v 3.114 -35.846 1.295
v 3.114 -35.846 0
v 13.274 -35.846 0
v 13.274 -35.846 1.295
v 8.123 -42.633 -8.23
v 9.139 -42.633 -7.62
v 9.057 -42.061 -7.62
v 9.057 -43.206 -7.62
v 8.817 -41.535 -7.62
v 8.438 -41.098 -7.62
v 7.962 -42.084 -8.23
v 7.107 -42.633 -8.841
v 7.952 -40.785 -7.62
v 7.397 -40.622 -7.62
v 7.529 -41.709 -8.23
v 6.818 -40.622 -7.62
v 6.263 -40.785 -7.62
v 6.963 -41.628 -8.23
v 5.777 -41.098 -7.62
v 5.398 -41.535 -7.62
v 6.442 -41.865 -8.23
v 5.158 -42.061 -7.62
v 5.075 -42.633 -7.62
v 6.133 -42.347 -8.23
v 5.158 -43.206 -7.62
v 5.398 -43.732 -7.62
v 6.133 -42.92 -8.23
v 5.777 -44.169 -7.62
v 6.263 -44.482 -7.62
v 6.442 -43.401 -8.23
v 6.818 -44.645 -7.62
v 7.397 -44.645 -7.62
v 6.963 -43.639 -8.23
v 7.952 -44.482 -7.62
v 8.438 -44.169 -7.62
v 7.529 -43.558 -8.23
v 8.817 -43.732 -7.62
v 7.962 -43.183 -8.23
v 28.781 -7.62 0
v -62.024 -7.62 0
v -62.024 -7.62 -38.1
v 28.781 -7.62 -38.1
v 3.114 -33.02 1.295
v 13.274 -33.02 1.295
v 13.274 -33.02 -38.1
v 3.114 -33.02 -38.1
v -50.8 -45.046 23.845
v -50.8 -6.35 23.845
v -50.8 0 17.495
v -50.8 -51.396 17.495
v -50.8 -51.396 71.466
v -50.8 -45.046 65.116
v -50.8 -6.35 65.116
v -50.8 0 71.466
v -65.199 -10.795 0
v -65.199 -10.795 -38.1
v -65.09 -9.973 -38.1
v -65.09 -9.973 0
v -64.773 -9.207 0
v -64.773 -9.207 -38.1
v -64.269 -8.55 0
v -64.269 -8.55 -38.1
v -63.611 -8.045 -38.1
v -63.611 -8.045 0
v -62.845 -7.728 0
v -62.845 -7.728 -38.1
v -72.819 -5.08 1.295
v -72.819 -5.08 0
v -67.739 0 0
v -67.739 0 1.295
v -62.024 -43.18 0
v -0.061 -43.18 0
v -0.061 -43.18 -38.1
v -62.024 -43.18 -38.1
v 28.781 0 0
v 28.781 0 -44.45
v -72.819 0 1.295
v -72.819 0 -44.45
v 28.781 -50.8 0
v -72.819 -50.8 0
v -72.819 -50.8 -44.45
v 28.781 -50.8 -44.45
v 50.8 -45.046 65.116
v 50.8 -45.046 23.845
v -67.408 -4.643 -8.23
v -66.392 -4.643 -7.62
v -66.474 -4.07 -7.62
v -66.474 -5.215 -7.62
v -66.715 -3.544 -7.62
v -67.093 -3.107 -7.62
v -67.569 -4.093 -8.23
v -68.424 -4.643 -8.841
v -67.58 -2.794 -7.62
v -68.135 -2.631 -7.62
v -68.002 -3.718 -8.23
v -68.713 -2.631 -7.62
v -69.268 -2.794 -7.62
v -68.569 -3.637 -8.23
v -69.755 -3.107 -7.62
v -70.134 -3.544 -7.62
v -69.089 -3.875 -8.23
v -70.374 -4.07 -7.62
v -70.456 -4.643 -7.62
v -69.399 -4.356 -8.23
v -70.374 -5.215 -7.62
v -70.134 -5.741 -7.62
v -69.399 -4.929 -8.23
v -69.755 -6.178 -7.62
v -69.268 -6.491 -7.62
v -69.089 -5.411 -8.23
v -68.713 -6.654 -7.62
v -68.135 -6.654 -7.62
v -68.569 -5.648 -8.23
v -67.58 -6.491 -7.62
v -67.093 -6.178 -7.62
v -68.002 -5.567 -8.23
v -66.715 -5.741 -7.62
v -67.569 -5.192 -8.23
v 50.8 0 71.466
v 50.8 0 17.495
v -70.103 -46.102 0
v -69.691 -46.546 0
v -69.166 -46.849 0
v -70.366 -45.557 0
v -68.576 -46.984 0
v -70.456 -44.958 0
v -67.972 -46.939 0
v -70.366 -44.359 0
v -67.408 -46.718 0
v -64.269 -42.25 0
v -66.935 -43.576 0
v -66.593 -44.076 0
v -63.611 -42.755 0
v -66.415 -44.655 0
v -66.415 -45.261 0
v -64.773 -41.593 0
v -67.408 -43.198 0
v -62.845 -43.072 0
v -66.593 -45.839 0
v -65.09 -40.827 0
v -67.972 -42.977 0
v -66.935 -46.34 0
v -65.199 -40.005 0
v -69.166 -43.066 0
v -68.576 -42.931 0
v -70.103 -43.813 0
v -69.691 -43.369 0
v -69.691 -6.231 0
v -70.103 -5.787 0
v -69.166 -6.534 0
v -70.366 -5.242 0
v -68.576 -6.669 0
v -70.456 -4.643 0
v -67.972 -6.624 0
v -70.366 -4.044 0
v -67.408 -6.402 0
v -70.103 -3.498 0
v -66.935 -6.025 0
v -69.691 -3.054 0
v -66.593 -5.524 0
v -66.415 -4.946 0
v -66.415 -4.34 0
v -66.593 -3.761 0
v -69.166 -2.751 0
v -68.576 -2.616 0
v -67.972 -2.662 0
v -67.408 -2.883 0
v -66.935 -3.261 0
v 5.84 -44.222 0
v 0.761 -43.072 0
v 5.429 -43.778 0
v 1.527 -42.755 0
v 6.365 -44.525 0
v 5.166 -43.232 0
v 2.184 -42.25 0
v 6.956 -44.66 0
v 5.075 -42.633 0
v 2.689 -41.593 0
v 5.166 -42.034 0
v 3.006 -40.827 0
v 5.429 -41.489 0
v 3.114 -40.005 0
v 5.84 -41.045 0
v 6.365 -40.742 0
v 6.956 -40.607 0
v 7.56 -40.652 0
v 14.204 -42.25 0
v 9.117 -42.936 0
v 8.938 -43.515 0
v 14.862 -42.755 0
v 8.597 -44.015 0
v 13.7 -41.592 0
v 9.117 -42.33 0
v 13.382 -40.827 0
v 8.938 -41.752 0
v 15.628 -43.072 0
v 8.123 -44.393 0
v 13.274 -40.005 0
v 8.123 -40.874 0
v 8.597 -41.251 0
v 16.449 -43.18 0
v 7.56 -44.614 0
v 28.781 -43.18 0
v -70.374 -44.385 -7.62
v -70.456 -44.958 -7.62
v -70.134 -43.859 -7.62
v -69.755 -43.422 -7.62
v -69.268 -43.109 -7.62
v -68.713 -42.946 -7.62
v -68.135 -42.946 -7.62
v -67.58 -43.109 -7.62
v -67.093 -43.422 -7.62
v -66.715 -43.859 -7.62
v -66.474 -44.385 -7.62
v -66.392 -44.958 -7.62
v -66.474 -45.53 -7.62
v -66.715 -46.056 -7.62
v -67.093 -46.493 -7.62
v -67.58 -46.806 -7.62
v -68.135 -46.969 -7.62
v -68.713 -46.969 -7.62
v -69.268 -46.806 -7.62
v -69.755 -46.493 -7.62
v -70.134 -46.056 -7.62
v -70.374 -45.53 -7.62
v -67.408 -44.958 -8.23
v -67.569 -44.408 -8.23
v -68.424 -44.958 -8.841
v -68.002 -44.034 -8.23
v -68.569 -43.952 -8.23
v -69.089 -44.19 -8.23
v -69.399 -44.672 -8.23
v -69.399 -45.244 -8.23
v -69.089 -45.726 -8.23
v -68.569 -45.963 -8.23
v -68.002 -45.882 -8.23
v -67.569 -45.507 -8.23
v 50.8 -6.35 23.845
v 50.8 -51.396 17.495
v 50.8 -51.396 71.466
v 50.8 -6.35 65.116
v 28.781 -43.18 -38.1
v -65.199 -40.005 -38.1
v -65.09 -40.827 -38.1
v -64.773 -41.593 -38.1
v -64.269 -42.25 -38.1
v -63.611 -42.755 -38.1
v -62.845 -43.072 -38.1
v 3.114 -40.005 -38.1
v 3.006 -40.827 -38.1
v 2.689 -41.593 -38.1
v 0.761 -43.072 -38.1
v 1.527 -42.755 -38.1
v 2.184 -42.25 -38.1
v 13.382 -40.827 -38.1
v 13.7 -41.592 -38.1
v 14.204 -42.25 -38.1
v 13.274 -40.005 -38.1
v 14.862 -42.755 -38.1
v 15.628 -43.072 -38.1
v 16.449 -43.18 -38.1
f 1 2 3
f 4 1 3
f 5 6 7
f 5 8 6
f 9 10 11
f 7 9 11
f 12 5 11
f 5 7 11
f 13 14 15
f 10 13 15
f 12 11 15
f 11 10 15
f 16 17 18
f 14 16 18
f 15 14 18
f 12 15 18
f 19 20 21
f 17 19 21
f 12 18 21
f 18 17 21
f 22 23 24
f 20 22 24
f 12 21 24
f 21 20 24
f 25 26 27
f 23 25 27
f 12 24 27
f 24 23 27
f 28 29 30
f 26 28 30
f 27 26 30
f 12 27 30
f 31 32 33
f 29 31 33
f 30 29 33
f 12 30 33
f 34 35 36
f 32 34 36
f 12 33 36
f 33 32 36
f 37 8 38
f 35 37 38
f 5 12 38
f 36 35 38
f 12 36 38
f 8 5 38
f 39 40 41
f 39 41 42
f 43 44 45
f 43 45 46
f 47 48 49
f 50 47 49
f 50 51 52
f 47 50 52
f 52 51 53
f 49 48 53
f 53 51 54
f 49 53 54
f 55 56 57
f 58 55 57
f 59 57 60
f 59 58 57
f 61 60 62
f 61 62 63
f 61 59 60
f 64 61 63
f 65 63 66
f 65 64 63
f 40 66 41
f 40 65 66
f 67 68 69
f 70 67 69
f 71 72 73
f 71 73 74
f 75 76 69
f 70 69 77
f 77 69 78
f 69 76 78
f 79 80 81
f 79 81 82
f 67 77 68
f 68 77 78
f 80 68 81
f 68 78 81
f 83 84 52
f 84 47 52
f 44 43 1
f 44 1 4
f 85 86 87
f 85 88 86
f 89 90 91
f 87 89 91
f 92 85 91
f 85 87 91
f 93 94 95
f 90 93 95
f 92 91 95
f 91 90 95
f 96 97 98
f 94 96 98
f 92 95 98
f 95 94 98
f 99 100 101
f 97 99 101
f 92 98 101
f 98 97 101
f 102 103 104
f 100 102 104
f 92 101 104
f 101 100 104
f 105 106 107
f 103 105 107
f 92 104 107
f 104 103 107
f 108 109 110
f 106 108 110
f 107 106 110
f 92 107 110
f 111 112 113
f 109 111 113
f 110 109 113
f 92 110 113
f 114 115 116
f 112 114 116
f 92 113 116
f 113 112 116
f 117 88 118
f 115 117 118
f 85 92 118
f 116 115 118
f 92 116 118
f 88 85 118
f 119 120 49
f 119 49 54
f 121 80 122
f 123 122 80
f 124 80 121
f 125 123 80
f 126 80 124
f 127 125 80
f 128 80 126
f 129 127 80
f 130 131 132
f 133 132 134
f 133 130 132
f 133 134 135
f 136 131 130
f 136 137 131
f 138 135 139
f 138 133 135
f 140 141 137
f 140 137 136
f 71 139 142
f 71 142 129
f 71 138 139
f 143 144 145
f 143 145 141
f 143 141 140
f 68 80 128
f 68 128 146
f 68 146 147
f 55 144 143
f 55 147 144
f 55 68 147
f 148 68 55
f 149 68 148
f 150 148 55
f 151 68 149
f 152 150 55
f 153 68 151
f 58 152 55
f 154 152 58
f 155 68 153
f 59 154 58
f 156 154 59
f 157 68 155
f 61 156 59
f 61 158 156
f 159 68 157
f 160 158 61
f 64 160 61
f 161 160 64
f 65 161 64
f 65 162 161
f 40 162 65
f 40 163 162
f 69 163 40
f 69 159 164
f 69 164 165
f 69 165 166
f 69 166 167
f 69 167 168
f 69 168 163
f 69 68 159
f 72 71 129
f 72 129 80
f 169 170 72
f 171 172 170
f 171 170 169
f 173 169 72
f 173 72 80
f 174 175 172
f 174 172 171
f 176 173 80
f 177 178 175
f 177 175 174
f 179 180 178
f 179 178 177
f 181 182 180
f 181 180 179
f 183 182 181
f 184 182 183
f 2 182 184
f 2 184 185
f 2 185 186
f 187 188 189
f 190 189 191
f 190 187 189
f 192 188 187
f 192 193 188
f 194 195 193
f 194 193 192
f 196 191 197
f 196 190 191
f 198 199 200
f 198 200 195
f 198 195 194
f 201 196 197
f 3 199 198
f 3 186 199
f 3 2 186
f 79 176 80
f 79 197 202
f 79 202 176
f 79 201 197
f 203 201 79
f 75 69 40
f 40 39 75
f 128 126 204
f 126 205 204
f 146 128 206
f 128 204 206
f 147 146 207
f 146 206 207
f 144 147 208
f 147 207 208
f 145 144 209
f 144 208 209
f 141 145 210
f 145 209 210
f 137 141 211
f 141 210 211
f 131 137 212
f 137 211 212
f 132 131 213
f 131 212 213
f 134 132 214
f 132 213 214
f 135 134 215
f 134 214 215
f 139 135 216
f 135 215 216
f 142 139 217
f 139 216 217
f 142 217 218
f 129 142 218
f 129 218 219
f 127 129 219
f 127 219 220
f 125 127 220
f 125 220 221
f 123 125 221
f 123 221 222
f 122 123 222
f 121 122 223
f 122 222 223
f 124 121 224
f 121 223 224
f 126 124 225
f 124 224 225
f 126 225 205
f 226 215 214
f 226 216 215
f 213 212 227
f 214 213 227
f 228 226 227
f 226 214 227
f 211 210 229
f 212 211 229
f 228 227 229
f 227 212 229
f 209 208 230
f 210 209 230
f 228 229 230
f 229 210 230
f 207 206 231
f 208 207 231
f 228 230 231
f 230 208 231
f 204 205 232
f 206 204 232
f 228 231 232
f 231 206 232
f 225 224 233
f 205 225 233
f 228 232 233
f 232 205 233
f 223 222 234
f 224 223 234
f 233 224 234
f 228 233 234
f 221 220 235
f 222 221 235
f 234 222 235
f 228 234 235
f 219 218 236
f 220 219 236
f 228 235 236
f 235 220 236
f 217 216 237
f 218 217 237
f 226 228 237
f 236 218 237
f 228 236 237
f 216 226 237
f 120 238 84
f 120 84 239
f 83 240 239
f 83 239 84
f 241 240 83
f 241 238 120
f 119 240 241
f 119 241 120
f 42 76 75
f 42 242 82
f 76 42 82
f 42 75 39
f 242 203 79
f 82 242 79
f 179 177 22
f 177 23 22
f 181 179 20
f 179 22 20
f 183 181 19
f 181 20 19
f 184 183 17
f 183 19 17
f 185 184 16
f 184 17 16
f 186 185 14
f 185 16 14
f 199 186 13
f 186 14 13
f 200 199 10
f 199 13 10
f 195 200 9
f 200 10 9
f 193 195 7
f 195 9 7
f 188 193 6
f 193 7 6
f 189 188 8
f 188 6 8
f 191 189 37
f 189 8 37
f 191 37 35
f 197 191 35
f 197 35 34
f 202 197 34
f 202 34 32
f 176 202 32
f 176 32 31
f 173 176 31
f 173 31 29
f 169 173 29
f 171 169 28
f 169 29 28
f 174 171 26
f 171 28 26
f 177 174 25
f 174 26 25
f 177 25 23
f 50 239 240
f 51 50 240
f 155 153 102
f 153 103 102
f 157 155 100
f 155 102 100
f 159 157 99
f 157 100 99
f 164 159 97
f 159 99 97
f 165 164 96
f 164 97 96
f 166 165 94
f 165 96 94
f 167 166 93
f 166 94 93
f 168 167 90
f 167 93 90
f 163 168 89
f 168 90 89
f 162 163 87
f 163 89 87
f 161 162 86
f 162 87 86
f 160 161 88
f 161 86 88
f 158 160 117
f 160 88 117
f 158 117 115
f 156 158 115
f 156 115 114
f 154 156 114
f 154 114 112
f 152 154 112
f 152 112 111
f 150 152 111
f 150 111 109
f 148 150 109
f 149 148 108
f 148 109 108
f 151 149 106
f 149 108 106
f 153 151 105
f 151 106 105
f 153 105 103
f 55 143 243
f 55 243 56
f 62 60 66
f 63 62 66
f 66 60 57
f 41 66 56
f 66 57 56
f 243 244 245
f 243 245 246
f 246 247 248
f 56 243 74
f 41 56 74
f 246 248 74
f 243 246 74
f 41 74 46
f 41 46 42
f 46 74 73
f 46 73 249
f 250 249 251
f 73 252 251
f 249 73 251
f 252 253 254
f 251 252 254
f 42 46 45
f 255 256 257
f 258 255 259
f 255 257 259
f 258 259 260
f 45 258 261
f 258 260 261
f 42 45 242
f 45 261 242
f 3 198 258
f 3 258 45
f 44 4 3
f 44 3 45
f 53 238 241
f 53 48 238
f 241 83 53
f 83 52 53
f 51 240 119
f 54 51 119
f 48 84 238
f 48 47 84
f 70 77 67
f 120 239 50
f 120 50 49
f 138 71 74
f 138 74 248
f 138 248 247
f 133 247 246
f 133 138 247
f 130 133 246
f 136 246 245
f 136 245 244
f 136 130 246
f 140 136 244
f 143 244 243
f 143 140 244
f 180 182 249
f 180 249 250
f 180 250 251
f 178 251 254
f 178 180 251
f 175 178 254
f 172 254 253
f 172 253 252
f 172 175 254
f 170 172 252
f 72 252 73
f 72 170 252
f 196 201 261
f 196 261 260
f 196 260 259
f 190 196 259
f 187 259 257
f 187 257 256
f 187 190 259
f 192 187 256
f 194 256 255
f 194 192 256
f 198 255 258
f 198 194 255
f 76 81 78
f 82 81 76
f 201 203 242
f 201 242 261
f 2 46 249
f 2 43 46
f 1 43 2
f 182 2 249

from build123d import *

# Parameters (mm, degrees)
F1_DEPTH      = 38.1
F2_W          = 101.6
F2_H          = 50.8
F3_DEPTH      = 6.35
F4_W          = 10.16
F4_H          = 2.8264755118
F5_DEPTH      = 1.2954
F7_D          = 4.064
F7_DEPTH      = 7.62
F7_TIP        = 1.2209487779
F8_W          = 51.3956062496
F8_H          = 53.9707001299
F9_DEPTH      = 50.8
F9_DEPTH_BACK = 50.8
F10_T         = -6.35


with BuildPart() as f1:
    # F0 (on Top) → F1 (new body)
    with BuildSketch(Plane.XY):
        with BuildLine():
            Line((-72.818674798, 0), (-72.818674798, -50.8))
            Line((-72.818674798, -50.8), (28.781325202, -50.8))
            Line((28.781325202, -50.8), (28.781325202, -43.18))
            Line((28.781325202, -43.18), (16.4492722979, -43.18))
            ThreePointArc((16.4492722979, -43.18), (14.2042082677, -42.2500640303), (13.2742722979, -40.005))
            Line((13.2742722979, -40.005), (13.2742722979, -33.02))
            Line((13.2742722979, -33.02), (3.1142722979, -33.02))
            Line((3.1142722979, -33.02), (3.1142722979, -40.005))
            ThreePointArc((3.1142722979, -40.005), (2.1843363282, -42.2500640303), (-0.0607277021, -43.18))
            Line((-0.0607277021, -43.18), (-62.023674798, -43.18))
            ThreePointArc((-62.023674798, -43.18), (-64.2687388283, -42.2500640303), (-65.198674798, -40.005))
            Line((-65.198674798, -40.005), (-65.198674798, -10.795))
            ThreePointArc((-65.198674798, -10.795), (-64.2687388283, -8.5499359697), (-62.023674798, -7.62))
            Line((-62.023674798, -7.62), (28.781325202, -7.62))
            Line((28.781325202, -7.62), (28.781325202, 0))
            Line((28.781325202, 0), (-72.818674798, 0))
        make_face()
    extrude(amount=-F1_DEPTH)

    # F2 (on face) → F3 (join)
    with BuildSketch(Plane(origin=(0, 0, -38.1), x_dir=(1, 0, 0), z_dir=(0, 0, -1))):
        with Locations((-22.018674798, 25.4)):
            Rectangle(F2_W, F2_H)
    extrude(amount=F3_DEPTH)

    # F4 (on face) → F5 (join)
    with BuildSketch(Plane.XY):
        Polygon((-72.818674798, 0), (-72.818674798, -5.08), (-67.738674798, 0), align=None)
        with Locations((8.1942722979, -34.4332377559)):
            Rectangle(F4_W, F4_H)
    extrude(amount=F5_DEPTH)

    # F7
    with Locations(Plane.XY):
        with Locations((-68.4241205454, -4.642683547), (-68.4241205454, -44.9577718973), (7.1074273437, -42.6333211362)):
            Hole(F7_D / 2, depth=F7_DEPTH)
            with Locations((0, 0, -(F7_DEPTH + F7_TIP / 2))):  # 118° drill point
                Cone(0, F7_D / 2, F7_TIP, mode=Mode.SUBTRACT)


with BuildPart() as f9:
    # F8 (on Right) → F9 (new body, two sides)
    with BuildSketch(Plane.YZ) as f9_sk:
        with Locations((-25.6978031248, 44.4805743173)):
            Rectangle(F8_W, F8_H)
    extrude(amount=-F9_DEPTH)
    extrude(f9_sk.sketch, amount=F9_DEPTH_BACK)

    # F10
    f10_openings = [f9.faces().sort_by_distance(p)[0] for p in [
        (50.8, -25.697803, 44.480574),
        (-50.8, -25.697803, 44.480574),
    ]]
    offset(amount=F10_T, openings=f10_openings)


solid = Compound([f1.part, f9.part])
